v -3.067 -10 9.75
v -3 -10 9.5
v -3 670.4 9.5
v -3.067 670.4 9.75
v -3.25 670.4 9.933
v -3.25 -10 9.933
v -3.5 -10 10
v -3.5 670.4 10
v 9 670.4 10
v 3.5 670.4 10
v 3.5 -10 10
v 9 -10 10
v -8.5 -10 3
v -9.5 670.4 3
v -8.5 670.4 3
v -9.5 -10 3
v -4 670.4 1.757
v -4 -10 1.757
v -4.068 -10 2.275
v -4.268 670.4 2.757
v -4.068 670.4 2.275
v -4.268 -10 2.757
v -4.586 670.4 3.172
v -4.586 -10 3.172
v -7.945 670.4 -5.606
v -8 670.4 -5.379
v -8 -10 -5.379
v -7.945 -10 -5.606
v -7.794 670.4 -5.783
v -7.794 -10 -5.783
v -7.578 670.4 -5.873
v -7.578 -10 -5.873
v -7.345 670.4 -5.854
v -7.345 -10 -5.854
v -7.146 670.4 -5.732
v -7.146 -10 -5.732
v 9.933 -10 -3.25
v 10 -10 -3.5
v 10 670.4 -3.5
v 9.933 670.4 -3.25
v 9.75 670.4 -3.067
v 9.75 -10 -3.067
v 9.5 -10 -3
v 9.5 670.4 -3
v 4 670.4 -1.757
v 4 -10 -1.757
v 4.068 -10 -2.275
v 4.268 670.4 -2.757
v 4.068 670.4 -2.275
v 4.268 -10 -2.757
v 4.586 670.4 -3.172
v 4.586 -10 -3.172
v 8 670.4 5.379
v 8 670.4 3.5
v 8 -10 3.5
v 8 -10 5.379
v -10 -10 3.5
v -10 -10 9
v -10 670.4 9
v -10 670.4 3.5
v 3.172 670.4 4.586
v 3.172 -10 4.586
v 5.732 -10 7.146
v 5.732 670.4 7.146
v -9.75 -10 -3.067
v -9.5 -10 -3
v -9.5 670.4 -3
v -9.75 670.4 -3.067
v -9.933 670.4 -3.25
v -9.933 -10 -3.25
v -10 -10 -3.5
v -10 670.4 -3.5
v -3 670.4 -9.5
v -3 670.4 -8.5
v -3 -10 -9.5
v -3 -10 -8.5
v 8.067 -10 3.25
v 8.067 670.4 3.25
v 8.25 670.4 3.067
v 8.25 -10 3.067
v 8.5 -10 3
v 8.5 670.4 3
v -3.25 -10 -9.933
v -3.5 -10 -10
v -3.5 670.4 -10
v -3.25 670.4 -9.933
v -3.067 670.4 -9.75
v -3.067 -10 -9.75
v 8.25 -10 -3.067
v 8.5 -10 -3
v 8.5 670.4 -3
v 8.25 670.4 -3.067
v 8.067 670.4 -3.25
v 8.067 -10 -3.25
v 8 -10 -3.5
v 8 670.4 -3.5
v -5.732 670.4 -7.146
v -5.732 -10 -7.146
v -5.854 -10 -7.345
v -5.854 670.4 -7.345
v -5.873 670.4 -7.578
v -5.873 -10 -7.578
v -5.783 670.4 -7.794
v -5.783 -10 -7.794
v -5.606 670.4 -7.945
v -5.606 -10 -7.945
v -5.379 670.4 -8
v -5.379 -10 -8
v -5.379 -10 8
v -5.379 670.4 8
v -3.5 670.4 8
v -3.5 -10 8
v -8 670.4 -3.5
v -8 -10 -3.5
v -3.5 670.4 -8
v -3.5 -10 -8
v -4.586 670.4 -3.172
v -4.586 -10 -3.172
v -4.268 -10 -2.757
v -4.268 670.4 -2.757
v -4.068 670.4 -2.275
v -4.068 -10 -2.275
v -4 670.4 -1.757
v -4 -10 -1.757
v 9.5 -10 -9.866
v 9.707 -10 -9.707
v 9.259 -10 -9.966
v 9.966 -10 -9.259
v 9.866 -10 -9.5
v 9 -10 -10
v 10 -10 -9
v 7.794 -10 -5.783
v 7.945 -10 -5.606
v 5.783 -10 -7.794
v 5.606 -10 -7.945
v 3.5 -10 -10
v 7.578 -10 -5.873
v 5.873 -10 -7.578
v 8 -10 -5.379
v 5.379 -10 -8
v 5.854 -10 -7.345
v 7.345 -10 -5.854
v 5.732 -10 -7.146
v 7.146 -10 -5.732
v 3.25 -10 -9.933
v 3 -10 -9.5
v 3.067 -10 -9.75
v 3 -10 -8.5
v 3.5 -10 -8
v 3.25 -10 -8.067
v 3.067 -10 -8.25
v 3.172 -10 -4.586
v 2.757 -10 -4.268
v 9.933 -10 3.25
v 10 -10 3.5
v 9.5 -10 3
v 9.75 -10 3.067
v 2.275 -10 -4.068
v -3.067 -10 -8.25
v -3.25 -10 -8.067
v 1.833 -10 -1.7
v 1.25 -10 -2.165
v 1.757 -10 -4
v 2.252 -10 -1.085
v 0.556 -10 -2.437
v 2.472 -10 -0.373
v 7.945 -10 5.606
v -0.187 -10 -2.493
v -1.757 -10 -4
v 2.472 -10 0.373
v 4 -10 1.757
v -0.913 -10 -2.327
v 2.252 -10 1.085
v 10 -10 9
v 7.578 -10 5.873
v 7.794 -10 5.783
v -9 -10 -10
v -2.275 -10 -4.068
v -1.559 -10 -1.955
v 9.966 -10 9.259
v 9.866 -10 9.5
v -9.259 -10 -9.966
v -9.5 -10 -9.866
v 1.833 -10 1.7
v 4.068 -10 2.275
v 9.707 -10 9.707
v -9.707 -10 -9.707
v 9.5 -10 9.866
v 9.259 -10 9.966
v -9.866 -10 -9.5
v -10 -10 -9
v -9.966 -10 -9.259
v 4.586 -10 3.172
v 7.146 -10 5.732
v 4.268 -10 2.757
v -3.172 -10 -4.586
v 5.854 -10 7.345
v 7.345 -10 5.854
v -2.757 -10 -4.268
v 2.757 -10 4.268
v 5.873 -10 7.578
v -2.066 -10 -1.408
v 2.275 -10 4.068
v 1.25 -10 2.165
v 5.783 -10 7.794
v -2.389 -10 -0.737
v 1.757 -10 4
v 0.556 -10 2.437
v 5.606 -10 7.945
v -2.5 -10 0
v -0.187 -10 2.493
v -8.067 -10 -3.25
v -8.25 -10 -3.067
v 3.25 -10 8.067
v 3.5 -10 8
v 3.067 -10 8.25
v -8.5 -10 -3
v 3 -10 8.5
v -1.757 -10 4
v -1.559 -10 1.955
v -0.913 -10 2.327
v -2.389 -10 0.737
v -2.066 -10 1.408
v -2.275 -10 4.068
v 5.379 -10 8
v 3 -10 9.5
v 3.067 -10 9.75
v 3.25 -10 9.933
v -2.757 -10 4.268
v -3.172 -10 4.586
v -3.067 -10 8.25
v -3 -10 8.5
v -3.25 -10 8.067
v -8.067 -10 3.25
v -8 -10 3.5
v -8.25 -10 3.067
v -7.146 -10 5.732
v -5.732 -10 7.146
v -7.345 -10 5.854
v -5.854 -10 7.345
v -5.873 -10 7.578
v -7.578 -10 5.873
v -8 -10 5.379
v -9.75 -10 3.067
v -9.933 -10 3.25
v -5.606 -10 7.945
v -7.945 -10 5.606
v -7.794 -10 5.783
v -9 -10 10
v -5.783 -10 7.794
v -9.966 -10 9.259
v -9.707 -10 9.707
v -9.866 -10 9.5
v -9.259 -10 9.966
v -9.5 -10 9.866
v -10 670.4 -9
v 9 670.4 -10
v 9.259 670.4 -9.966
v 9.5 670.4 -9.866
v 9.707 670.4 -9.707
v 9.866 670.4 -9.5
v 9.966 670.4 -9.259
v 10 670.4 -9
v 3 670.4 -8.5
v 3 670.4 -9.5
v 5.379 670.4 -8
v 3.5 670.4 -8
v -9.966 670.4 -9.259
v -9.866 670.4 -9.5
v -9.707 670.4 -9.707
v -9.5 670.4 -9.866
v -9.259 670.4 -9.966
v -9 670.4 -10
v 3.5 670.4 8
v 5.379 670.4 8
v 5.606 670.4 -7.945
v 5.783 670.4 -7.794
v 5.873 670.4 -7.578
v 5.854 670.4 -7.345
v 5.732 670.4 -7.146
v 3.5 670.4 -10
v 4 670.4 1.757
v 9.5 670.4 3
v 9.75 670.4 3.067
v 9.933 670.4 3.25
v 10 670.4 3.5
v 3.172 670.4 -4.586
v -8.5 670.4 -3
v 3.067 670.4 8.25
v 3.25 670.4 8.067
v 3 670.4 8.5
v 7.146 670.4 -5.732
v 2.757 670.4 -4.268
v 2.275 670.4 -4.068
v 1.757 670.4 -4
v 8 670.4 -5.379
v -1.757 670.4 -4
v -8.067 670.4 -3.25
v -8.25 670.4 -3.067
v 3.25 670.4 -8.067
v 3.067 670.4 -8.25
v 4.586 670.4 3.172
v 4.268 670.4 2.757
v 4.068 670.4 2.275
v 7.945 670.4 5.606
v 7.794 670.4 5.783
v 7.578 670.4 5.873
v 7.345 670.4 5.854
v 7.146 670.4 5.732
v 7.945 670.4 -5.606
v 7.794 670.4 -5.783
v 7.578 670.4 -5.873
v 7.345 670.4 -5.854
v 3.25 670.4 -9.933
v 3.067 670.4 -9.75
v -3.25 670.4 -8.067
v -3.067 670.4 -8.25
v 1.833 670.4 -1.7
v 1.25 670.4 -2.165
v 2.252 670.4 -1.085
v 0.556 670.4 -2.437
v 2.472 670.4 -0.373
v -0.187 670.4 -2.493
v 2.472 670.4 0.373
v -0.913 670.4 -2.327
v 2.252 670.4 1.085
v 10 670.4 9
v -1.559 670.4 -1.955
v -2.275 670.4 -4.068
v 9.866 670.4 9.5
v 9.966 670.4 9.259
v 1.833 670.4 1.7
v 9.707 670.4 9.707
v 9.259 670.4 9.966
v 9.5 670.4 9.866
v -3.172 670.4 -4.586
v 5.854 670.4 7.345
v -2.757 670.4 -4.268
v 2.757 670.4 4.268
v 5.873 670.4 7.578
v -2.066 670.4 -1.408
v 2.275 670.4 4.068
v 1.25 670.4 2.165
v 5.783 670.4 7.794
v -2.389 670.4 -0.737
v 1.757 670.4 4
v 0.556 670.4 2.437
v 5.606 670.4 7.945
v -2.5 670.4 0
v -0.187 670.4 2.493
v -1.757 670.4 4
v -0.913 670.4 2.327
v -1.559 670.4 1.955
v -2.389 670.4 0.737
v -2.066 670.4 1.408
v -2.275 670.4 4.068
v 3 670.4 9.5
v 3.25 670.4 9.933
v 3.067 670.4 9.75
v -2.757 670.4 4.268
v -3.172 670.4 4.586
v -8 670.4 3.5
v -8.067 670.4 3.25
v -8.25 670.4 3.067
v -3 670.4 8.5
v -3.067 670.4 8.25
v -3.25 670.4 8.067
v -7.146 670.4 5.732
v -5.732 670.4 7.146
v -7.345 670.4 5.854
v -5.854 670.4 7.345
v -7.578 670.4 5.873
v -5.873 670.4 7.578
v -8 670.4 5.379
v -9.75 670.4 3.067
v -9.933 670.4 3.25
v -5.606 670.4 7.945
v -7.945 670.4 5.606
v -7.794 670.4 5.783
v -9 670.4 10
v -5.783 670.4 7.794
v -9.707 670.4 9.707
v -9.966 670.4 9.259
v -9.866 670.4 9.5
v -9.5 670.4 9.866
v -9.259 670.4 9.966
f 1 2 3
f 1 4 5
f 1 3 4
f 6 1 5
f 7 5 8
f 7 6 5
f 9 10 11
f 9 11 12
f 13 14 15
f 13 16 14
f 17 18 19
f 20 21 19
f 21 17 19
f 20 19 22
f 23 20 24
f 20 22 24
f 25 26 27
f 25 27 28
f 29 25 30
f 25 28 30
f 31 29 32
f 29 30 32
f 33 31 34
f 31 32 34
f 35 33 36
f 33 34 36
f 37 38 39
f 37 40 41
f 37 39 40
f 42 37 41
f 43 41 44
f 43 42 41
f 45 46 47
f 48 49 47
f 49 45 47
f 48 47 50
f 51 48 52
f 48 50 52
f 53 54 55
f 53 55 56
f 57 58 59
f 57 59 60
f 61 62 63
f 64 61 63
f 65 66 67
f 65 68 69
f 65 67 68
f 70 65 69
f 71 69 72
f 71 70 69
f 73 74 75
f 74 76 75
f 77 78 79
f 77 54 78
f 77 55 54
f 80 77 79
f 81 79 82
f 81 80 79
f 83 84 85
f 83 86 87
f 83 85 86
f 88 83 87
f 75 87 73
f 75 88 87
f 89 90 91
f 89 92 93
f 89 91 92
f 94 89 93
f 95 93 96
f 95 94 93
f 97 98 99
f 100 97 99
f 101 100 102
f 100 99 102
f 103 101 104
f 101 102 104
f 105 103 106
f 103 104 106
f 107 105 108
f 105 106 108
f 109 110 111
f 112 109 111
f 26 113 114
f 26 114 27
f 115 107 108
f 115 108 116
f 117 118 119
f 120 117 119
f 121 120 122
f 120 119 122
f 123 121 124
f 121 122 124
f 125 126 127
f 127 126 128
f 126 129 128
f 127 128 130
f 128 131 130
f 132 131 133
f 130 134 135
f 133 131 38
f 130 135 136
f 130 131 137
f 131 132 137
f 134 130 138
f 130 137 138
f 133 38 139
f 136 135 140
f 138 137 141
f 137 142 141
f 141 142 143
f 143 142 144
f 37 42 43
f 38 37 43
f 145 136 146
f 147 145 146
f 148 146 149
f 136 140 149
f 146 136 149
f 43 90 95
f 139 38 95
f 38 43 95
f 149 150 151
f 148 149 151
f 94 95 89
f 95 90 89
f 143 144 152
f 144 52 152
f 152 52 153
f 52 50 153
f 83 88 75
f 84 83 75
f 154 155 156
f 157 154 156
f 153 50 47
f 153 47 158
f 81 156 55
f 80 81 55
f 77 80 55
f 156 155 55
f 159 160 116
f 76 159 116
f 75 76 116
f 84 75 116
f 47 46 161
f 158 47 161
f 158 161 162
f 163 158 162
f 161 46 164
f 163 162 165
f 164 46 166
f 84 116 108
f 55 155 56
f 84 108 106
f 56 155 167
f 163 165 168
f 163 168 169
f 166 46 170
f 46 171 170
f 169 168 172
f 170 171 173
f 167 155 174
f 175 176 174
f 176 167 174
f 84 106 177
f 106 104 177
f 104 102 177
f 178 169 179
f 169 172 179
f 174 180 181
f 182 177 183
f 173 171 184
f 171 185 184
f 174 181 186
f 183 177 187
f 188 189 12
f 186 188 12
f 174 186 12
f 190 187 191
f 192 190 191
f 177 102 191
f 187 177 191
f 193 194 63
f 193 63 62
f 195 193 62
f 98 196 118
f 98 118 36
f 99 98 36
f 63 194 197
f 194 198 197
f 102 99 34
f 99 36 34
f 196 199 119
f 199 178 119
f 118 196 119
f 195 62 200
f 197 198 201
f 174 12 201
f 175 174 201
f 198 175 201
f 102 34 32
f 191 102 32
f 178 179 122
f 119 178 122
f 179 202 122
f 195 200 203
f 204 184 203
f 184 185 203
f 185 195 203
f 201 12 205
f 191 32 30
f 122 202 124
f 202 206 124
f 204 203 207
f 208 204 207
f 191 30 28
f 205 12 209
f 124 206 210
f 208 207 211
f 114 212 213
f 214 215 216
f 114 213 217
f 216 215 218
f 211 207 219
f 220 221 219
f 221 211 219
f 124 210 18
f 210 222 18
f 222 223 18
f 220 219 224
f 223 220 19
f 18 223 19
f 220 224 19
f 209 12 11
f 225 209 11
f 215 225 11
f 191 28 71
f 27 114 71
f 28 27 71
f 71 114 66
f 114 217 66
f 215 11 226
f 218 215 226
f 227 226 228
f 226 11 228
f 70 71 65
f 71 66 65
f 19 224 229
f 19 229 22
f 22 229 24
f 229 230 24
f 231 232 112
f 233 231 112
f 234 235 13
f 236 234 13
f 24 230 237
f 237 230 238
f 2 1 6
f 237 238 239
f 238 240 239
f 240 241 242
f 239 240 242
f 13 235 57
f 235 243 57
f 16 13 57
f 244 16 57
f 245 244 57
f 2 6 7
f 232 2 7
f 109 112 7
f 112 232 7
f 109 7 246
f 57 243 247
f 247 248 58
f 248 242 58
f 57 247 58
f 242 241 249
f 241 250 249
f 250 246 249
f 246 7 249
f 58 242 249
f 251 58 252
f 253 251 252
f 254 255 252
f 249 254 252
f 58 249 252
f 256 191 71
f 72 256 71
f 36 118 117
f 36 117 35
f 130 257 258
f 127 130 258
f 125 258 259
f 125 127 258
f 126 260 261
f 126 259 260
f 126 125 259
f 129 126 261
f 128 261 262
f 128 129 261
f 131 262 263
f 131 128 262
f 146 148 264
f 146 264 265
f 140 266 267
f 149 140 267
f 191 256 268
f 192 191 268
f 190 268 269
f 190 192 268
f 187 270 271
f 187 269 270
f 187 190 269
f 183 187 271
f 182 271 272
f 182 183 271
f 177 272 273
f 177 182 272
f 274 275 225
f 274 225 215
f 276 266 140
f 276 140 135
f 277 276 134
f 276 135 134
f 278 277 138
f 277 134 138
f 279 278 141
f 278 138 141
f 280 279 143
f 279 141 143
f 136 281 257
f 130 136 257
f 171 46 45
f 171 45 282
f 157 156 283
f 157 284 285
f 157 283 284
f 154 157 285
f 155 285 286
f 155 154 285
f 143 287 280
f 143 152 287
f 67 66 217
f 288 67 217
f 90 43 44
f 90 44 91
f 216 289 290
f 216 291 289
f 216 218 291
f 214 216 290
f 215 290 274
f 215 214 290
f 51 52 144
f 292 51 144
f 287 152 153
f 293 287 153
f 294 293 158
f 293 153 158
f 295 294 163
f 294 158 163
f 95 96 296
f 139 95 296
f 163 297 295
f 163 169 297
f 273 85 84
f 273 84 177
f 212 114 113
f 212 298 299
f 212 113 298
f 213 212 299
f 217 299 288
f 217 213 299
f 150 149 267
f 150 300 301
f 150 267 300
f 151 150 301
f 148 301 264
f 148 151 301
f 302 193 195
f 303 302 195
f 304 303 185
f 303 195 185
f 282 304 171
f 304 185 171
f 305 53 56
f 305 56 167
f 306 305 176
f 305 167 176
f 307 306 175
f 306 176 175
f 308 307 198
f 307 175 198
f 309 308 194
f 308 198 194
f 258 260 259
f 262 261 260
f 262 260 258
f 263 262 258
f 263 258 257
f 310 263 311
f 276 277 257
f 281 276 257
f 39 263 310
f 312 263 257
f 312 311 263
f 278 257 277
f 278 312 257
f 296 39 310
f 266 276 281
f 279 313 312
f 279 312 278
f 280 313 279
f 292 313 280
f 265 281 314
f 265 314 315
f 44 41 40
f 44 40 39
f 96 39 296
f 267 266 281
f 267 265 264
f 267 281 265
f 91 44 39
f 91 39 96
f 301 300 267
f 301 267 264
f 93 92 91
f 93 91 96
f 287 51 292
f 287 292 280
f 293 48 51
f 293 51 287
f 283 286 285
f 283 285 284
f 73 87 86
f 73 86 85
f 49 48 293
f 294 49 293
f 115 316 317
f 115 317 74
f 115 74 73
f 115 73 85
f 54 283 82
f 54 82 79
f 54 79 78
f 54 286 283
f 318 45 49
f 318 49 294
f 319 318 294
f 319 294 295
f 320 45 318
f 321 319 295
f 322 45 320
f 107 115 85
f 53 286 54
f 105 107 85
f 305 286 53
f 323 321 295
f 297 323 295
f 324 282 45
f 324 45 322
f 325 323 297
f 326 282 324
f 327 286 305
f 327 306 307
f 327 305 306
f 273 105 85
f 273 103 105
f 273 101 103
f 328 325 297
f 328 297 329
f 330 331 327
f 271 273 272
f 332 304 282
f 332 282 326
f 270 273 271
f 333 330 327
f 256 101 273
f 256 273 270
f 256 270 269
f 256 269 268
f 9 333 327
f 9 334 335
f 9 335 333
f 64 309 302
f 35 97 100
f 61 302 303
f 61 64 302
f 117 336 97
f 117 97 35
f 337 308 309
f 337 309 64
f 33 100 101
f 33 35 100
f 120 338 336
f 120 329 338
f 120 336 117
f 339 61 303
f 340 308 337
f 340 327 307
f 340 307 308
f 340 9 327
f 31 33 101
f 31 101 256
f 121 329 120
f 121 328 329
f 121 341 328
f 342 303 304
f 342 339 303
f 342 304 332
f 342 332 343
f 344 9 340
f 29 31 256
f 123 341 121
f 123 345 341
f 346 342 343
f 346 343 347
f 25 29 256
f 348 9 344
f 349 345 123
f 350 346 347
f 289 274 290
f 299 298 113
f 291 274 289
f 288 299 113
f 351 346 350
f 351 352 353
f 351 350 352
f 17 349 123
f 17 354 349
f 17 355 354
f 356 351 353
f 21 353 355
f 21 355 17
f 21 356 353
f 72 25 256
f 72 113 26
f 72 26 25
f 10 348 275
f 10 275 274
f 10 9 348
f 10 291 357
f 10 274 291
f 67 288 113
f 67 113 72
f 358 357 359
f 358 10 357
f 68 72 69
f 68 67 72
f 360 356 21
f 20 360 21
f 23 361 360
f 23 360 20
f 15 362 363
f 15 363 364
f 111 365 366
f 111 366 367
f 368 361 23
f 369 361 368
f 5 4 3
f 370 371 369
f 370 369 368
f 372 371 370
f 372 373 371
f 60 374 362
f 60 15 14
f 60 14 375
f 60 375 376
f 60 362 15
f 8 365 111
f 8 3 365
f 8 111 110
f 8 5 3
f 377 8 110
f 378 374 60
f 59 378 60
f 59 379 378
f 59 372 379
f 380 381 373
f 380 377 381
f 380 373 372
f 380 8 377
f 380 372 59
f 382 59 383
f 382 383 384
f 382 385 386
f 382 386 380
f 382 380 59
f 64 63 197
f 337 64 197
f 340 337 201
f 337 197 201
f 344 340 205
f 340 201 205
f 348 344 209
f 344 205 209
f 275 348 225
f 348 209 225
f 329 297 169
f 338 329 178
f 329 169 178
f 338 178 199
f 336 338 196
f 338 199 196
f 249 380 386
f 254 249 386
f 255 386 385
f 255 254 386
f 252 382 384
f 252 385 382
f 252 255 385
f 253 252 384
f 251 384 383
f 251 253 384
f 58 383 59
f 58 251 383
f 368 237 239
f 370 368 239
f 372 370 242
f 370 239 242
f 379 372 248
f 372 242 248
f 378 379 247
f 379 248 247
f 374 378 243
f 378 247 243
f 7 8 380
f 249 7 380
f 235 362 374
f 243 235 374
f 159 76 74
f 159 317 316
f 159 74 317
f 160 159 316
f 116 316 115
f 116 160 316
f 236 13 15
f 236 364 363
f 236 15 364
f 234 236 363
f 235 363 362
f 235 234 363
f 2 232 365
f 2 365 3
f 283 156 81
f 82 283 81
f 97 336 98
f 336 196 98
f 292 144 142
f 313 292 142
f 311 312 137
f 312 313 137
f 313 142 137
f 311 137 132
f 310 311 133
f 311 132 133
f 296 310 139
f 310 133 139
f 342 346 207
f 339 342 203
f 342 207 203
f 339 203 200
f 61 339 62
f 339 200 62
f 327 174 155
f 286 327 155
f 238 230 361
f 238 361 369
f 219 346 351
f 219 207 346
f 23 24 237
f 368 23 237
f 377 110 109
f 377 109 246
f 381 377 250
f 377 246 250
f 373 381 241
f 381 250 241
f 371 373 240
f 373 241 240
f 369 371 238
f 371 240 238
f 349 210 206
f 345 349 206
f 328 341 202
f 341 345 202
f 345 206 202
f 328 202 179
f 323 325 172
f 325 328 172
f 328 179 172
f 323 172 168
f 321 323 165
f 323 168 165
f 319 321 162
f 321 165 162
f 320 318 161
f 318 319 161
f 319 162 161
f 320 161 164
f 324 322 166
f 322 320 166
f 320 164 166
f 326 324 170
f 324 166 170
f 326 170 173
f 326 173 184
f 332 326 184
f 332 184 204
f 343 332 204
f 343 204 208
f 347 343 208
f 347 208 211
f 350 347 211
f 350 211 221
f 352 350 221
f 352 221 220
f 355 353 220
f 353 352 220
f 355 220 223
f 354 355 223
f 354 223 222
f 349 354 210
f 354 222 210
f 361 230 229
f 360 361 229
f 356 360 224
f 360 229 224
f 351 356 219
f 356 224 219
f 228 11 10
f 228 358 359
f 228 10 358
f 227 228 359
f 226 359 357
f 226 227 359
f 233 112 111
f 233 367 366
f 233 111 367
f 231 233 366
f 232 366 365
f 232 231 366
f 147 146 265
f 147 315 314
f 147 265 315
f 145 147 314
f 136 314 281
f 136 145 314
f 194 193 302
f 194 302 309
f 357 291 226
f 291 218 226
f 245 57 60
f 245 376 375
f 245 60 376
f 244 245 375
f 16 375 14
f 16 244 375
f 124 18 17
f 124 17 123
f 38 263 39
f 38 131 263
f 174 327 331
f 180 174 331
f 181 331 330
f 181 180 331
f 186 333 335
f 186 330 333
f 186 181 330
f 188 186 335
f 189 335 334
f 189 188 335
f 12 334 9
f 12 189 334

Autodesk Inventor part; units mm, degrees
ref_plane "Start Plane" through (0, -10, 0) normal (0, 1, 0) x (-1, 0, 0)
ref_plane "End Plane" through (0, 670.4, 0) normal (0, 1, 0) x (-1, 0, 0)
sketch "Sketch" plane through (0, 0, 0) normal (0, 1, 0) x (-1, 0, 0)
  line L0 (-1.7574, 4) -> (1.7574, 4)
  line L1 (4, 1.7574) -> (4, -1.7574)
  line L2 (1.7574, -4) -> (-1.7574, -4)
  line L3 (-4, -1.7574) -> (-4, 1.7574)
  line L4 (4.5858, -3.1716) -> (7.1464, -5.7322)
  line L5 (3.1716, -4.5858) -> (5.7322, -7.1464)
  line L6 (5.3787, -8) -> (3.5, -8)
  line L7 (3, -8.5) -> (3, -9.5)
  line L8 (3.5, -10) -> (9, -10)
  line L9 (10, -9) -> (10, -3.5)
  line L10 (9.5, -3) -> (8.5, -3)
  line L11 (8, -3.5) -> (8, -5.3787)
  line L12 (4, 0) -> (-4, 0) construction
  line L13 (0, -4) -> (0, 4) construction
  arc A0 (4, -1.7574) -> (4.5858, -3.1716) centre (6, -1.7574) ccw
  arc A1 (3.1716, -4.5858) -> (1.7574, -4) centre (1.7574, -6) ccw
  arc A2 (3.5, -8) -> (3, -8.5) centre (3.5, -8.5) ccw
  arc A3 (3, -9.5) -> (3.5, -10) centre (3.5, -9.5) ccw
  arc A4 (10, -3.5) -> (9.5, -3) centre (9.5, -3.5) ccw
  arc A5 (8.5, -3) -> (8, -3.5) centre (8.5, -3.5) ccw
  arc A6 (7.1464, -5.7322) -> (8, -5.3787) centre (7.5, -5.3787) ccw
  arc A7 (5.3787, -8) -> (5.7322, -7.1464) centre (5.3787, -7.5) ccw
  arc A8 (9, -10) -> (10, -9) centre (9, -9) ccw
  line L14 (-4.5858, -3.1716) -> (-7.1464, -5.7322)
  line L15 (-3.1716, -4.5858) -> (-5.7322, -7.1464)
  line L16 (-5.3787, -8) -> (-3.5, -8)
  line L17 (-3, -8.5) -> (-3, -9.5)
  line L18 (-3.5, -10) -> (-9, -10)
  line L19 (-10, -9) -> (-10, -3.5)
  line L20 (-9.5, -3) -> (-8.5, -3)
  line L21 (-8, -3.5) -> (-8, -5.3787)
  arc A9 (-4.5858, -3.1716) -> (-4, -1.7574) centre (-6, -1.7574) ccw
  arc A10 (-1.7574, -4) -> (-3.1716, -4.5858) centre (-1.7574, -6) ccw
  arc A11 (-3, -8.5) -> (-3.5, -8) centre (-3.5, -8.5) ccw
  arc A12 (-3.5, -10) -> (-3, -9.5) centre (-3.5, -9.5) ccw
  arc A13 (-9.5, -3) -> (-10, -3.5) centre (-9.5, -3.5) ccw
  arc A14 (-8, -3.5) -> (-8.5, -3) centre (-8.5, -3.5) ccw
  arc A15 (-8, -5.3787) -> (-7.1464, -5.7322) centre (-7.5, -5.3787) ccw
  arc A16 (-5.7322, -7.1464) -> (-5.3787, -8) centre (-5.3787, -7.5) ccw
  arc A17 (-10, -9) -> (-9, -10) centre (-9, -9) ccw
  line L22 (4.5858, 3.1716) -> (7.1464, 5.7322)
  line L23 (3.1716, 4.5858) -> (5.7322, 7.1464)
  line L24 (5.3787, 8) -> (3.5, 8)
  line L25 (3, 8.5) -> (3, 9.5)
  line L26 (3.5, 10) -> (9, 10)
  line L27 (10, 9) -> (10, 3.5)
  line L28 (9.5, 3) -> (8.5, 3)
  line L29 (8, 3.5) -> (8, 5.3787)
  arc A18 (4.5858, 3.1716) -> (4, 1.7574) centre (6, 1.7574) ccw
  arc A19 (1.7574, 4) -> (3.1716, 4.5858) centre (1.7574, 6) ccw
  arc A20 (3, 8.5) -> (3.5, 8) centre (3.5, 8.5) ccw
  arc A21 (3.5, 10) -> (3, 9.5) centre (3.5, 9.5) ccw
  arc A22 (9.5, 3) -> (10, 3.5) centre (9.5, 3.5) ccw
  arc A23 (8, 3.5) -> (8.5, 3) centre (8.5, 3.5) ccw
  arc A24 (8, 5.3787) -> (7.1464, 5.7322) centre (7.5, 5.3787) ccw
  arc A25 (5.7322, 7.1464) -> (5.3787, 8) centre (5.3787, 7.5) ccw
  arc A26 (10, 9) -> (9, 10) centre (9, 9) ccw
  line L30 (-10, 9) -> (-10, 3.5)
  arc A27 (-9, 10) -> (-10, 9) centre (-9, 9) ccw
  arc A28 (-10, 3.5) -> (-9.5, 3) centre (-9.5, 3.5) ccw
  line L31 (-9.5, 3) -> (-8.5, 3)
  arc A29 (-8.5, 3) -> (-8, 3.5) centre (-8.5, 3.5) ccw
  line L32 (-8, 3.5) -> (-8, 5.3787)
  arc A30 (-7.1464, 5.7322) -> (-8, 5.3787) centre (-7.5, 5.3787) ccw
  line L33 (-4.5858, 3.1716) -> (-7.1464, 5.7322)
  line L34 (-3.1716, 4.5858) -> (-5.7322, 7.1464)
  arc A31 (-3.1716, 4.5858) -> (-1.7574, 4) centre (-1.7574, 6) ccw
  arc A32 (-4, 1.7574) -> (-4.5858, 3.1716) centre (-6, 1.7574) ccw
  arc A33 (-5.3787, 8) -> (-5.7322, 7.1464) centre (-5.3787, 7.5) ccw
  line L35 (-5.3787, 8) -> (-3.5, 8)
  arc A34 (-3.5, 8) -> (-3, 8.5) centre (-3.5, 8.5) ccw
  line L36 (-3, 8.5) -> (-3, 9.5)
  arc A35 (-3, 9.5) -> (-3.5, 10) centre (-3.5, 9.5) ccw
  line L37 (-3.5, 10) -> (-9, 10)
  circle A36 centre (0, 0) radius 2.5
  point P0 (3, -8)
  point P1 (3, -10)
  point P2 (10, -10)
  dimension "d3" = 2
  dimension "d4" = 2
  dimension "d5" = 7
  dimension "d6" = 2
  dimension "d7" = 0.5
  dimension "d8" = 1
  dimension "d9" = 20
  dimension "d10" = 20
  dimension "d11" = 8
  dimension "d13" = 5
  dimension "d14" = 8
extrude "Body" add sketch "Sketch" along normal up to surface (680.4 mm away) from surface at -10
sketch "Sketch4" plane through (0, 0, 0) normal (0, 1, 0) x (-1, 0, 0)
  line L0 (0, 0) -> (10, 0)
ref_plane "Work Plane4" through (0, 0, 0) normal (0, 0, -1) x (-1, 0, 0)
sketch "Sketch5" plane through (0, 0, 0) normal (0, 0, -1) x (-1, 0, 0)
  line L0 (-2, -10) -> (12, -10)
  line L1 (-2, 670.4) -> (12, 670.4)
  dimension "d22" = 680.4
ref_plane "Work Plane5" through (3.5, 670.4, 0) normal (0, 1, 0) x (1, 0, 0)
split "Split1" plane through (3.5, 670.4, 0) removes the side toward (0, 1, 0)
ref_plane "Work Plane6" through (-9, -10, -279.4) normal (0, -1, 0) x (1, 0, 0)
split "Split2" plane through (-9, -10, -279.4) removes the side toward (0, -1, 0)
equation "\"d18\" = Length + G_OFFSET_END"
equation "\"G_L\" = d22"
equation "\"Length\" = 660.4"
equation "\"G_OFFSET_END\" = 10"
properties part number "A3.3"
